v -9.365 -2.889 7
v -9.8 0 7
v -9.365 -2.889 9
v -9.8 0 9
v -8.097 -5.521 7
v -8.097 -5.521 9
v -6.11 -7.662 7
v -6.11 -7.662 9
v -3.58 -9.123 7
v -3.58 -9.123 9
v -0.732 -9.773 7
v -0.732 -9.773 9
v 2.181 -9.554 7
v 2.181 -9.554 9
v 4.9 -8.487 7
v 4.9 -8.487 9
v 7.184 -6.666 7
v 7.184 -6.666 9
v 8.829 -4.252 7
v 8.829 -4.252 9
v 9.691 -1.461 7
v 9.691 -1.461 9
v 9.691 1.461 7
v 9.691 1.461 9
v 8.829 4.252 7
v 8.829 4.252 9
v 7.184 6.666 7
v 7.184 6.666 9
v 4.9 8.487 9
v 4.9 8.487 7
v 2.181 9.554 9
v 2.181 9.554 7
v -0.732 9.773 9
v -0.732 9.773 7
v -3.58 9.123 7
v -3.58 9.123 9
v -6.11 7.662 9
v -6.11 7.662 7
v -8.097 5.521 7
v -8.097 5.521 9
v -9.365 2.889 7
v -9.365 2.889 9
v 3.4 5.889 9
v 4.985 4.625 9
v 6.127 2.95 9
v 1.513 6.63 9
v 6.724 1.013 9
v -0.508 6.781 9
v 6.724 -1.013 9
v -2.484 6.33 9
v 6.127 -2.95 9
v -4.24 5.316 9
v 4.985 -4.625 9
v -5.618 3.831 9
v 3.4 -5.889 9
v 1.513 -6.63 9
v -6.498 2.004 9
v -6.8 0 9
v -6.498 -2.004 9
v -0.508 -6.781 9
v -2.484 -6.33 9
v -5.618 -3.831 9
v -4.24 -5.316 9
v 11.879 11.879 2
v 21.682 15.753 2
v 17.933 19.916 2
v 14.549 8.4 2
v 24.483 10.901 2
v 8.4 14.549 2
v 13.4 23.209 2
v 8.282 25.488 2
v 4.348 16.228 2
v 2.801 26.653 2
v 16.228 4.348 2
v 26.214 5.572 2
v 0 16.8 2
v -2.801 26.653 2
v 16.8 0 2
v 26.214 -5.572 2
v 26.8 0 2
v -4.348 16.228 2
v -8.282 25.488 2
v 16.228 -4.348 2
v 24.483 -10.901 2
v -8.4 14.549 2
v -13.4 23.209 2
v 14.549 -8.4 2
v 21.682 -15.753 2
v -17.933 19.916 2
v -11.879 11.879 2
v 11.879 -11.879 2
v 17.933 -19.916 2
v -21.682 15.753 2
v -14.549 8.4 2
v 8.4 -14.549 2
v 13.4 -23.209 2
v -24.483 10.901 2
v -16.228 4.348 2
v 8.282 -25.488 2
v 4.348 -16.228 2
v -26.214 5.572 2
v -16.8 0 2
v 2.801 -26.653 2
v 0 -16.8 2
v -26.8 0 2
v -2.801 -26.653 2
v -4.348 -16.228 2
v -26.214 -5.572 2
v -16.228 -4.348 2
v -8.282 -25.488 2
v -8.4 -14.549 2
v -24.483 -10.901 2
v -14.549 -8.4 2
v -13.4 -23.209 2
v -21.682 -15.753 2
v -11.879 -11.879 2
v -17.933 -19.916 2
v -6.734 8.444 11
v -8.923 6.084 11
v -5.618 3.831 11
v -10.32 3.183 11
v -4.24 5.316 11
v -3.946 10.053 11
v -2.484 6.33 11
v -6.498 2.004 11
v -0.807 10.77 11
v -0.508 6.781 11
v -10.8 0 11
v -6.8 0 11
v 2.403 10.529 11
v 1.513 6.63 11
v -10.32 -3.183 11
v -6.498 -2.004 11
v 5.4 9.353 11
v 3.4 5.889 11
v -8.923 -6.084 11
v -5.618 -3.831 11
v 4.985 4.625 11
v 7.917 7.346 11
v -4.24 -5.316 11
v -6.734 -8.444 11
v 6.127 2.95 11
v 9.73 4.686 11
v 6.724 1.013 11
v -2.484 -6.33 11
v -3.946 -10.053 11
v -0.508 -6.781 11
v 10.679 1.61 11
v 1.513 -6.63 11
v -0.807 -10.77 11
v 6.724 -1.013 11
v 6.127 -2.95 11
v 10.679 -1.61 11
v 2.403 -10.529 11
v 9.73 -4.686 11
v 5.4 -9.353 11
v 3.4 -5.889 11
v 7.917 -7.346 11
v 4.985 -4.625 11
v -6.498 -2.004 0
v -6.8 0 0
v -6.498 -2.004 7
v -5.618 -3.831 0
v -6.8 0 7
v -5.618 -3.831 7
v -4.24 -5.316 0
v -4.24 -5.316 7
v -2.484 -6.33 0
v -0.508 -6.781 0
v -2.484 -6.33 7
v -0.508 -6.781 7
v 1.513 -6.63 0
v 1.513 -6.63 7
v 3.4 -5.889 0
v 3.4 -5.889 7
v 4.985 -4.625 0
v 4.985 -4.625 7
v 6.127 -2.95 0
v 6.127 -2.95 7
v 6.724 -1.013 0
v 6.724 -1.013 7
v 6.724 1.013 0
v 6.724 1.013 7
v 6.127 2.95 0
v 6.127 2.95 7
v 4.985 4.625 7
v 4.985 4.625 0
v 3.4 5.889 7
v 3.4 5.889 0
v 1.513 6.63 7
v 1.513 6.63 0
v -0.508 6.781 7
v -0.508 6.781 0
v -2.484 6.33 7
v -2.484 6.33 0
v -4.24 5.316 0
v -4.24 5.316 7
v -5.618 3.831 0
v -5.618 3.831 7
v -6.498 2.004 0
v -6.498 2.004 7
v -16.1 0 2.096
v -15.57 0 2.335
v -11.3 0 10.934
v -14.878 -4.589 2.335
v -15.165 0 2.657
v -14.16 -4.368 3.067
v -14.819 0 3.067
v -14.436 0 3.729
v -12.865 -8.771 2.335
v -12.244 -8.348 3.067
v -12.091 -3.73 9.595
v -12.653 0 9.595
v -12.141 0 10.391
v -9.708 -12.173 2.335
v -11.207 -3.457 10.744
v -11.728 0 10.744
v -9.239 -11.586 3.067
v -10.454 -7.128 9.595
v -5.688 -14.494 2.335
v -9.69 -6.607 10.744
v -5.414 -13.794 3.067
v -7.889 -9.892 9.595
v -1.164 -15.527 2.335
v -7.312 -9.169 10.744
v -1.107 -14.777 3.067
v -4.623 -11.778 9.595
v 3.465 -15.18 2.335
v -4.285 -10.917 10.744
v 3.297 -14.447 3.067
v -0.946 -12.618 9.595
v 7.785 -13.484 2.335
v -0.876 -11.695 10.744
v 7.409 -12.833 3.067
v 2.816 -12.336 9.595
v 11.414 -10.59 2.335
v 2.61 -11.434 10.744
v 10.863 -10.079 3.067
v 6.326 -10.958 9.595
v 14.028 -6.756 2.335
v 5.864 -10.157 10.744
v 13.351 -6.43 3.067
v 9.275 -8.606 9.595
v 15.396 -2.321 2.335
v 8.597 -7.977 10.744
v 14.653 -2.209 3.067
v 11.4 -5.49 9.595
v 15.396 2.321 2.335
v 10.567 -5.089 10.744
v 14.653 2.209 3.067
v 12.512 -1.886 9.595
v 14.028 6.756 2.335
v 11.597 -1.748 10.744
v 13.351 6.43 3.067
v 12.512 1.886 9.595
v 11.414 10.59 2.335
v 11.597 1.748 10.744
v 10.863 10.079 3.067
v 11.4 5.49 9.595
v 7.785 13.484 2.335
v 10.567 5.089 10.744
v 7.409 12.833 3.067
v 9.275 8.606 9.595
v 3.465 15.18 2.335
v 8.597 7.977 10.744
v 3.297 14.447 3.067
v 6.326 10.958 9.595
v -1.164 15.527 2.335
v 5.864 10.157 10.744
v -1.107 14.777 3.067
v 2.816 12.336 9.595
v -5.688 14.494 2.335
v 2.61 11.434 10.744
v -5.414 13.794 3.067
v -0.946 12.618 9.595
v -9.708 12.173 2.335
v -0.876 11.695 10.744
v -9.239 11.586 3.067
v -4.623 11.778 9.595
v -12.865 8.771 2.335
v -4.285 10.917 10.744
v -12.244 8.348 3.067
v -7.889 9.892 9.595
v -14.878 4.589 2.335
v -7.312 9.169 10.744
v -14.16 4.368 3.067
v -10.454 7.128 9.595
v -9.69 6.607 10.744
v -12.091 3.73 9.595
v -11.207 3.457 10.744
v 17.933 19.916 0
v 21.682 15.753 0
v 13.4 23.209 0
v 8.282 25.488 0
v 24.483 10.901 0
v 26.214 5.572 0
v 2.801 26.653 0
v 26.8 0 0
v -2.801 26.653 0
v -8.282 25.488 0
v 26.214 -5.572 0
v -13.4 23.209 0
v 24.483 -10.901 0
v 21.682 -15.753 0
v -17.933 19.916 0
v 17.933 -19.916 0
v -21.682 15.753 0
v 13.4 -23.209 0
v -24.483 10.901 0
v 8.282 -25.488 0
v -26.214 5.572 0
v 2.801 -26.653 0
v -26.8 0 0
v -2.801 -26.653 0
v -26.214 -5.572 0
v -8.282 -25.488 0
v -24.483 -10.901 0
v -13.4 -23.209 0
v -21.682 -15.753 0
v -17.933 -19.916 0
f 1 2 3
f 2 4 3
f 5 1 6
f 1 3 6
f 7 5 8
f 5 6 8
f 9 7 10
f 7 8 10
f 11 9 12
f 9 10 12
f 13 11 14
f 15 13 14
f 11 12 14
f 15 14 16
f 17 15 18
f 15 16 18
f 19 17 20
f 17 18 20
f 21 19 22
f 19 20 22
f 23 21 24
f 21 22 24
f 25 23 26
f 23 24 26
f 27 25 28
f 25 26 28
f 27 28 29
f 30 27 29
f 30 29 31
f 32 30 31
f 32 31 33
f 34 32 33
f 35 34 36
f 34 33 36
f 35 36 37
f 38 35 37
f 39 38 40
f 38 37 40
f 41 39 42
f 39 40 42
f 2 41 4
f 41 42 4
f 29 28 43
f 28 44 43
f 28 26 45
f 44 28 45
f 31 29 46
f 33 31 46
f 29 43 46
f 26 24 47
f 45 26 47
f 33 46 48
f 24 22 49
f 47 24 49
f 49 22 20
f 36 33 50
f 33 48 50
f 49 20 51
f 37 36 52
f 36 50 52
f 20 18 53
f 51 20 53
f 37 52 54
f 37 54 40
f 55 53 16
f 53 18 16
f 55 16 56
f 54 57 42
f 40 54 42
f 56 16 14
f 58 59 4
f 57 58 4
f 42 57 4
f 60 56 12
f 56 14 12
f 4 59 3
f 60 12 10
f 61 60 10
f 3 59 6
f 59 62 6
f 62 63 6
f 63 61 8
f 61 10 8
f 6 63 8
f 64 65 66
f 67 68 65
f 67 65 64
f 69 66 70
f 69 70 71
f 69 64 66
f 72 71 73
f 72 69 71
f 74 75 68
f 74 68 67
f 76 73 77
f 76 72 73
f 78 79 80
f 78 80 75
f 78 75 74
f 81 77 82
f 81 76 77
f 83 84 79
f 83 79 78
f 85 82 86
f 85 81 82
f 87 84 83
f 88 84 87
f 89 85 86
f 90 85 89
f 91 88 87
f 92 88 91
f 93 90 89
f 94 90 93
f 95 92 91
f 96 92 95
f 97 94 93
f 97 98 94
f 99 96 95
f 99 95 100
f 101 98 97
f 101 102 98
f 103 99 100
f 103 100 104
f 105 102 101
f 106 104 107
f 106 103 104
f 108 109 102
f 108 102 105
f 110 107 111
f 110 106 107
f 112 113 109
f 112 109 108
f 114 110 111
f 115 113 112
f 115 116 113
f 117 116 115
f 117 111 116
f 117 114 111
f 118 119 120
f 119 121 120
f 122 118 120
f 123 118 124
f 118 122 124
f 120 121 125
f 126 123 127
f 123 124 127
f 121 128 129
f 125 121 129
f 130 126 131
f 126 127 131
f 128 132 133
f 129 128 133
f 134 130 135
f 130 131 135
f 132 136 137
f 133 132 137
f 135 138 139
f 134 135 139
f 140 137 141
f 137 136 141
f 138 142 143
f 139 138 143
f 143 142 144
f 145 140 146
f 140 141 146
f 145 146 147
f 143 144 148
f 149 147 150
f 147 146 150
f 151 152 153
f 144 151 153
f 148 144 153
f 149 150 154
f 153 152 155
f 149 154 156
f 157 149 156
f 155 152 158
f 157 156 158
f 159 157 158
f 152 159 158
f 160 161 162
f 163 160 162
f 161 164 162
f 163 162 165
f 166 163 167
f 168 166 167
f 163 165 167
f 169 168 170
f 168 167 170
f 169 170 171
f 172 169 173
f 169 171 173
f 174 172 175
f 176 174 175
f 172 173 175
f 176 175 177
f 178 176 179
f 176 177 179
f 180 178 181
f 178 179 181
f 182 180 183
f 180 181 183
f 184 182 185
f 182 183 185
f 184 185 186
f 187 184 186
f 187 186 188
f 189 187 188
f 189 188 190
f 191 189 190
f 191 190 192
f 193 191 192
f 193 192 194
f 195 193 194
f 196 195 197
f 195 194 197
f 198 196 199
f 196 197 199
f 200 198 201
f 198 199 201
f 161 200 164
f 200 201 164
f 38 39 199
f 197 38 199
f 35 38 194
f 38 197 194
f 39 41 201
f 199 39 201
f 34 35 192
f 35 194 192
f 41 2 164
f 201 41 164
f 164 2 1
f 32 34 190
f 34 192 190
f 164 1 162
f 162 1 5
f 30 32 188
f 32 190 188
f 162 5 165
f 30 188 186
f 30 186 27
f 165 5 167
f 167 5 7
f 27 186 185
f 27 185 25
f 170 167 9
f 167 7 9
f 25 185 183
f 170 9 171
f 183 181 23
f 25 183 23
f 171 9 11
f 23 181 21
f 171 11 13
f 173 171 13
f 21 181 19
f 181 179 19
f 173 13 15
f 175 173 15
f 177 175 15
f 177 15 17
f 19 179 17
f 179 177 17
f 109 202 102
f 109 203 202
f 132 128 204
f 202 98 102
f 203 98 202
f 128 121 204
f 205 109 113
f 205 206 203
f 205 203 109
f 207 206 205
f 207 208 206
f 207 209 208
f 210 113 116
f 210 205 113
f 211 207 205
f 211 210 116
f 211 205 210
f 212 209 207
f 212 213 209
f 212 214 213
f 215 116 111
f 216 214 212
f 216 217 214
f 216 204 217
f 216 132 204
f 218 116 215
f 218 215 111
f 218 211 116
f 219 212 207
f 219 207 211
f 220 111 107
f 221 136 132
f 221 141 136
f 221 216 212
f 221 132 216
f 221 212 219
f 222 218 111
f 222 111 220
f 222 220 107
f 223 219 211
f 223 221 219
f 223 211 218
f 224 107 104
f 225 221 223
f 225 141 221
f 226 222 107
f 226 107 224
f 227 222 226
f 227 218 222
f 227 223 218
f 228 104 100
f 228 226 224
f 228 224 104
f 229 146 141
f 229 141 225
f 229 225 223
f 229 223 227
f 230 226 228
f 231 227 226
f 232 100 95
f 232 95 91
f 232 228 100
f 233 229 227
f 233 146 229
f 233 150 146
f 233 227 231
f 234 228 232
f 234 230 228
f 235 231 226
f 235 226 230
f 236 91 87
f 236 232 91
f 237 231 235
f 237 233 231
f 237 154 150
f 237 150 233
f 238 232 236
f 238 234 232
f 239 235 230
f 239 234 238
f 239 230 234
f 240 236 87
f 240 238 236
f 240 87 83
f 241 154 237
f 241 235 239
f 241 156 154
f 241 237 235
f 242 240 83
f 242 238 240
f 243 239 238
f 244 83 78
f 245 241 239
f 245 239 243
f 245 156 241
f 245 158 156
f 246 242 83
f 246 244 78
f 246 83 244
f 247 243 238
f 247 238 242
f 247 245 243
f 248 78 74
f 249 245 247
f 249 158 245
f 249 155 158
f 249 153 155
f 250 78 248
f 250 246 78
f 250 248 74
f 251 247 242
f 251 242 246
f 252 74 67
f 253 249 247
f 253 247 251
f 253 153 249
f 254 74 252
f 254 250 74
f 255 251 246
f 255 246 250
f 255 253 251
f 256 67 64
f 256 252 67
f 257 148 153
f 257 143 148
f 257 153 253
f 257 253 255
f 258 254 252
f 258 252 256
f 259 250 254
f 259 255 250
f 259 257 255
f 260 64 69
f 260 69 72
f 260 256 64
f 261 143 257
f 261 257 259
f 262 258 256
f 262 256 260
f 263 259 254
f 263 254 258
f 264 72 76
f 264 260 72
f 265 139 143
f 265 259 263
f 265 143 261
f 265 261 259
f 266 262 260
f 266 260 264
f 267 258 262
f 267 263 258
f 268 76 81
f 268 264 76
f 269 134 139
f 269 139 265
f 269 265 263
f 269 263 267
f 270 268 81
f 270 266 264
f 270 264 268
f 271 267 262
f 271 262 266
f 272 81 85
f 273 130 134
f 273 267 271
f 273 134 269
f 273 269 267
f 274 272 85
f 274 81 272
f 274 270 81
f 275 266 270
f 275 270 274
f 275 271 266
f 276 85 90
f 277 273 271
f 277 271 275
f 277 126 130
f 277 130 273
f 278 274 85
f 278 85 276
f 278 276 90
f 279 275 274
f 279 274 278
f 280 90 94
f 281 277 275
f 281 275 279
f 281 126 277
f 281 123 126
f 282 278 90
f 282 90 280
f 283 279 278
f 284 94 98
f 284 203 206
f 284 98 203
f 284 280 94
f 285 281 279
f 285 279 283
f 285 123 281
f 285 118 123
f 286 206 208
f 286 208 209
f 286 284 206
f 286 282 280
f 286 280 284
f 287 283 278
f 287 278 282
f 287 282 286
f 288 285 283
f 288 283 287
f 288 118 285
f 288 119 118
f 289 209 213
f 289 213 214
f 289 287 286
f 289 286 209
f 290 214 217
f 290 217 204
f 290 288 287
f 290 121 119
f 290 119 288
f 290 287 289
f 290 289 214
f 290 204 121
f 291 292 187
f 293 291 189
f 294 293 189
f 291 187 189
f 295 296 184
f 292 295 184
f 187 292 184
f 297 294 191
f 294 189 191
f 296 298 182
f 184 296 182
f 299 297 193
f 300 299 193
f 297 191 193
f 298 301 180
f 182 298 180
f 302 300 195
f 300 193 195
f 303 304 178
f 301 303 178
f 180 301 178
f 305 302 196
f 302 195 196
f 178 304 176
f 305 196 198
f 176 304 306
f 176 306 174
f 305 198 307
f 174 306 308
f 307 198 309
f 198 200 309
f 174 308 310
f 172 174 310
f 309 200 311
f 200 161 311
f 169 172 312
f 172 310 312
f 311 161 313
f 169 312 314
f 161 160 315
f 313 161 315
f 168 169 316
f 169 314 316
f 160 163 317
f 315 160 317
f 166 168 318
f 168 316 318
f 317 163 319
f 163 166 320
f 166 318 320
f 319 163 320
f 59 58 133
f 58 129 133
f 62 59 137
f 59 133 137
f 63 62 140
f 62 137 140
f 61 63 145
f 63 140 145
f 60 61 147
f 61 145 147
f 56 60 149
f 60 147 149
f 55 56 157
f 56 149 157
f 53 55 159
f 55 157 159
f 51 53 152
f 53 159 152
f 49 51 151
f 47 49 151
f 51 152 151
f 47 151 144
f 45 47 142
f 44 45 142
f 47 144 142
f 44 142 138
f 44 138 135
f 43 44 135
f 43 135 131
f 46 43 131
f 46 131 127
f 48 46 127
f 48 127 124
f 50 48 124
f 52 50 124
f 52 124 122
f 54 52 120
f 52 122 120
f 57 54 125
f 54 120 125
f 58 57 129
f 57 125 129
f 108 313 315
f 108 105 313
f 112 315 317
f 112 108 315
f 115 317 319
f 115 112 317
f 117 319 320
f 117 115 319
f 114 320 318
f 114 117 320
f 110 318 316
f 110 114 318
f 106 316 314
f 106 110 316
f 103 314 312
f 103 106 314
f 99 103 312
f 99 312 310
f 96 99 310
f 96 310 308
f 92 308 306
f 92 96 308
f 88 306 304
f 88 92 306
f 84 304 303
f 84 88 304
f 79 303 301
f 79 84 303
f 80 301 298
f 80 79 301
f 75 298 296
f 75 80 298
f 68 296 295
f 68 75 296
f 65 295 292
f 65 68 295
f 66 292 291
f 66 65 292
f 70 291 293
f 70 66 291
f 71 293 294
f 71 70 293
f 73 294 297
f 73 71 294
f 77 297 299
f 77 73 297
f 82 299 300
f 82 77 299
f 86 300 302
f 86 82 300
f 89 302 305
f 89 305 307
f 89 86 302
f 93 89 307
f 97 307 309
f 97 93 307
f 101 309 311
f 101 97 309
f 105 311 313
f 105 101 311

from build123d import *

# Parameters (mm, degrees)
F0_W   = 1
F0_H   = 2
F0_W_2 = 10


with BuildPart() as f1:
    # F0 (on Front) → F1 (revolve)
    with BuildSketch(Plane.XZ):
        Polygon((-6.8, 11), (-10.8, 11), (-10.8, 9), (-9.8, 9), (-6.8, 9), align=None)
        with Locations((-10.3, 8)):
            Rectangle(F0_W, F0_H)
        with BuildLine():
            add(Edge.make_bspline(
                [(-16.8, 2), (-12.629367, 2), (-14.361837, 11), (-10.8, 11)],
                knots=[0, 0, 0, 0, 10.816654, 10.816654, 10.816654, 10.816654], degree=3))
            Line((-16.8, 2), (-10.8, 2))
            Line((-10.8, 2), (-10.8, 7))
            Line((-10.8, 7), (-10.8, 9))
            Line((-10.8, 9), (-10.8, 11))
        make_face()
        Polygon((-10.8, 2), (-6.8, 2), (-6.8, 7), (-9.8, 7), (-10.8, 7), align=None)
        Polygon((-16.8, 0), (-6.8, 0), (-6.8, 2), (-10.8, 2), (-16.8, 2), align=None)
        with Locations((-21.8, 1)):
            Rectangle(F0_W_2, F0_H)
    revolve(axis=Axis((0, 0, 2.701946), (0, 0, 1)))


solid = f1.part
